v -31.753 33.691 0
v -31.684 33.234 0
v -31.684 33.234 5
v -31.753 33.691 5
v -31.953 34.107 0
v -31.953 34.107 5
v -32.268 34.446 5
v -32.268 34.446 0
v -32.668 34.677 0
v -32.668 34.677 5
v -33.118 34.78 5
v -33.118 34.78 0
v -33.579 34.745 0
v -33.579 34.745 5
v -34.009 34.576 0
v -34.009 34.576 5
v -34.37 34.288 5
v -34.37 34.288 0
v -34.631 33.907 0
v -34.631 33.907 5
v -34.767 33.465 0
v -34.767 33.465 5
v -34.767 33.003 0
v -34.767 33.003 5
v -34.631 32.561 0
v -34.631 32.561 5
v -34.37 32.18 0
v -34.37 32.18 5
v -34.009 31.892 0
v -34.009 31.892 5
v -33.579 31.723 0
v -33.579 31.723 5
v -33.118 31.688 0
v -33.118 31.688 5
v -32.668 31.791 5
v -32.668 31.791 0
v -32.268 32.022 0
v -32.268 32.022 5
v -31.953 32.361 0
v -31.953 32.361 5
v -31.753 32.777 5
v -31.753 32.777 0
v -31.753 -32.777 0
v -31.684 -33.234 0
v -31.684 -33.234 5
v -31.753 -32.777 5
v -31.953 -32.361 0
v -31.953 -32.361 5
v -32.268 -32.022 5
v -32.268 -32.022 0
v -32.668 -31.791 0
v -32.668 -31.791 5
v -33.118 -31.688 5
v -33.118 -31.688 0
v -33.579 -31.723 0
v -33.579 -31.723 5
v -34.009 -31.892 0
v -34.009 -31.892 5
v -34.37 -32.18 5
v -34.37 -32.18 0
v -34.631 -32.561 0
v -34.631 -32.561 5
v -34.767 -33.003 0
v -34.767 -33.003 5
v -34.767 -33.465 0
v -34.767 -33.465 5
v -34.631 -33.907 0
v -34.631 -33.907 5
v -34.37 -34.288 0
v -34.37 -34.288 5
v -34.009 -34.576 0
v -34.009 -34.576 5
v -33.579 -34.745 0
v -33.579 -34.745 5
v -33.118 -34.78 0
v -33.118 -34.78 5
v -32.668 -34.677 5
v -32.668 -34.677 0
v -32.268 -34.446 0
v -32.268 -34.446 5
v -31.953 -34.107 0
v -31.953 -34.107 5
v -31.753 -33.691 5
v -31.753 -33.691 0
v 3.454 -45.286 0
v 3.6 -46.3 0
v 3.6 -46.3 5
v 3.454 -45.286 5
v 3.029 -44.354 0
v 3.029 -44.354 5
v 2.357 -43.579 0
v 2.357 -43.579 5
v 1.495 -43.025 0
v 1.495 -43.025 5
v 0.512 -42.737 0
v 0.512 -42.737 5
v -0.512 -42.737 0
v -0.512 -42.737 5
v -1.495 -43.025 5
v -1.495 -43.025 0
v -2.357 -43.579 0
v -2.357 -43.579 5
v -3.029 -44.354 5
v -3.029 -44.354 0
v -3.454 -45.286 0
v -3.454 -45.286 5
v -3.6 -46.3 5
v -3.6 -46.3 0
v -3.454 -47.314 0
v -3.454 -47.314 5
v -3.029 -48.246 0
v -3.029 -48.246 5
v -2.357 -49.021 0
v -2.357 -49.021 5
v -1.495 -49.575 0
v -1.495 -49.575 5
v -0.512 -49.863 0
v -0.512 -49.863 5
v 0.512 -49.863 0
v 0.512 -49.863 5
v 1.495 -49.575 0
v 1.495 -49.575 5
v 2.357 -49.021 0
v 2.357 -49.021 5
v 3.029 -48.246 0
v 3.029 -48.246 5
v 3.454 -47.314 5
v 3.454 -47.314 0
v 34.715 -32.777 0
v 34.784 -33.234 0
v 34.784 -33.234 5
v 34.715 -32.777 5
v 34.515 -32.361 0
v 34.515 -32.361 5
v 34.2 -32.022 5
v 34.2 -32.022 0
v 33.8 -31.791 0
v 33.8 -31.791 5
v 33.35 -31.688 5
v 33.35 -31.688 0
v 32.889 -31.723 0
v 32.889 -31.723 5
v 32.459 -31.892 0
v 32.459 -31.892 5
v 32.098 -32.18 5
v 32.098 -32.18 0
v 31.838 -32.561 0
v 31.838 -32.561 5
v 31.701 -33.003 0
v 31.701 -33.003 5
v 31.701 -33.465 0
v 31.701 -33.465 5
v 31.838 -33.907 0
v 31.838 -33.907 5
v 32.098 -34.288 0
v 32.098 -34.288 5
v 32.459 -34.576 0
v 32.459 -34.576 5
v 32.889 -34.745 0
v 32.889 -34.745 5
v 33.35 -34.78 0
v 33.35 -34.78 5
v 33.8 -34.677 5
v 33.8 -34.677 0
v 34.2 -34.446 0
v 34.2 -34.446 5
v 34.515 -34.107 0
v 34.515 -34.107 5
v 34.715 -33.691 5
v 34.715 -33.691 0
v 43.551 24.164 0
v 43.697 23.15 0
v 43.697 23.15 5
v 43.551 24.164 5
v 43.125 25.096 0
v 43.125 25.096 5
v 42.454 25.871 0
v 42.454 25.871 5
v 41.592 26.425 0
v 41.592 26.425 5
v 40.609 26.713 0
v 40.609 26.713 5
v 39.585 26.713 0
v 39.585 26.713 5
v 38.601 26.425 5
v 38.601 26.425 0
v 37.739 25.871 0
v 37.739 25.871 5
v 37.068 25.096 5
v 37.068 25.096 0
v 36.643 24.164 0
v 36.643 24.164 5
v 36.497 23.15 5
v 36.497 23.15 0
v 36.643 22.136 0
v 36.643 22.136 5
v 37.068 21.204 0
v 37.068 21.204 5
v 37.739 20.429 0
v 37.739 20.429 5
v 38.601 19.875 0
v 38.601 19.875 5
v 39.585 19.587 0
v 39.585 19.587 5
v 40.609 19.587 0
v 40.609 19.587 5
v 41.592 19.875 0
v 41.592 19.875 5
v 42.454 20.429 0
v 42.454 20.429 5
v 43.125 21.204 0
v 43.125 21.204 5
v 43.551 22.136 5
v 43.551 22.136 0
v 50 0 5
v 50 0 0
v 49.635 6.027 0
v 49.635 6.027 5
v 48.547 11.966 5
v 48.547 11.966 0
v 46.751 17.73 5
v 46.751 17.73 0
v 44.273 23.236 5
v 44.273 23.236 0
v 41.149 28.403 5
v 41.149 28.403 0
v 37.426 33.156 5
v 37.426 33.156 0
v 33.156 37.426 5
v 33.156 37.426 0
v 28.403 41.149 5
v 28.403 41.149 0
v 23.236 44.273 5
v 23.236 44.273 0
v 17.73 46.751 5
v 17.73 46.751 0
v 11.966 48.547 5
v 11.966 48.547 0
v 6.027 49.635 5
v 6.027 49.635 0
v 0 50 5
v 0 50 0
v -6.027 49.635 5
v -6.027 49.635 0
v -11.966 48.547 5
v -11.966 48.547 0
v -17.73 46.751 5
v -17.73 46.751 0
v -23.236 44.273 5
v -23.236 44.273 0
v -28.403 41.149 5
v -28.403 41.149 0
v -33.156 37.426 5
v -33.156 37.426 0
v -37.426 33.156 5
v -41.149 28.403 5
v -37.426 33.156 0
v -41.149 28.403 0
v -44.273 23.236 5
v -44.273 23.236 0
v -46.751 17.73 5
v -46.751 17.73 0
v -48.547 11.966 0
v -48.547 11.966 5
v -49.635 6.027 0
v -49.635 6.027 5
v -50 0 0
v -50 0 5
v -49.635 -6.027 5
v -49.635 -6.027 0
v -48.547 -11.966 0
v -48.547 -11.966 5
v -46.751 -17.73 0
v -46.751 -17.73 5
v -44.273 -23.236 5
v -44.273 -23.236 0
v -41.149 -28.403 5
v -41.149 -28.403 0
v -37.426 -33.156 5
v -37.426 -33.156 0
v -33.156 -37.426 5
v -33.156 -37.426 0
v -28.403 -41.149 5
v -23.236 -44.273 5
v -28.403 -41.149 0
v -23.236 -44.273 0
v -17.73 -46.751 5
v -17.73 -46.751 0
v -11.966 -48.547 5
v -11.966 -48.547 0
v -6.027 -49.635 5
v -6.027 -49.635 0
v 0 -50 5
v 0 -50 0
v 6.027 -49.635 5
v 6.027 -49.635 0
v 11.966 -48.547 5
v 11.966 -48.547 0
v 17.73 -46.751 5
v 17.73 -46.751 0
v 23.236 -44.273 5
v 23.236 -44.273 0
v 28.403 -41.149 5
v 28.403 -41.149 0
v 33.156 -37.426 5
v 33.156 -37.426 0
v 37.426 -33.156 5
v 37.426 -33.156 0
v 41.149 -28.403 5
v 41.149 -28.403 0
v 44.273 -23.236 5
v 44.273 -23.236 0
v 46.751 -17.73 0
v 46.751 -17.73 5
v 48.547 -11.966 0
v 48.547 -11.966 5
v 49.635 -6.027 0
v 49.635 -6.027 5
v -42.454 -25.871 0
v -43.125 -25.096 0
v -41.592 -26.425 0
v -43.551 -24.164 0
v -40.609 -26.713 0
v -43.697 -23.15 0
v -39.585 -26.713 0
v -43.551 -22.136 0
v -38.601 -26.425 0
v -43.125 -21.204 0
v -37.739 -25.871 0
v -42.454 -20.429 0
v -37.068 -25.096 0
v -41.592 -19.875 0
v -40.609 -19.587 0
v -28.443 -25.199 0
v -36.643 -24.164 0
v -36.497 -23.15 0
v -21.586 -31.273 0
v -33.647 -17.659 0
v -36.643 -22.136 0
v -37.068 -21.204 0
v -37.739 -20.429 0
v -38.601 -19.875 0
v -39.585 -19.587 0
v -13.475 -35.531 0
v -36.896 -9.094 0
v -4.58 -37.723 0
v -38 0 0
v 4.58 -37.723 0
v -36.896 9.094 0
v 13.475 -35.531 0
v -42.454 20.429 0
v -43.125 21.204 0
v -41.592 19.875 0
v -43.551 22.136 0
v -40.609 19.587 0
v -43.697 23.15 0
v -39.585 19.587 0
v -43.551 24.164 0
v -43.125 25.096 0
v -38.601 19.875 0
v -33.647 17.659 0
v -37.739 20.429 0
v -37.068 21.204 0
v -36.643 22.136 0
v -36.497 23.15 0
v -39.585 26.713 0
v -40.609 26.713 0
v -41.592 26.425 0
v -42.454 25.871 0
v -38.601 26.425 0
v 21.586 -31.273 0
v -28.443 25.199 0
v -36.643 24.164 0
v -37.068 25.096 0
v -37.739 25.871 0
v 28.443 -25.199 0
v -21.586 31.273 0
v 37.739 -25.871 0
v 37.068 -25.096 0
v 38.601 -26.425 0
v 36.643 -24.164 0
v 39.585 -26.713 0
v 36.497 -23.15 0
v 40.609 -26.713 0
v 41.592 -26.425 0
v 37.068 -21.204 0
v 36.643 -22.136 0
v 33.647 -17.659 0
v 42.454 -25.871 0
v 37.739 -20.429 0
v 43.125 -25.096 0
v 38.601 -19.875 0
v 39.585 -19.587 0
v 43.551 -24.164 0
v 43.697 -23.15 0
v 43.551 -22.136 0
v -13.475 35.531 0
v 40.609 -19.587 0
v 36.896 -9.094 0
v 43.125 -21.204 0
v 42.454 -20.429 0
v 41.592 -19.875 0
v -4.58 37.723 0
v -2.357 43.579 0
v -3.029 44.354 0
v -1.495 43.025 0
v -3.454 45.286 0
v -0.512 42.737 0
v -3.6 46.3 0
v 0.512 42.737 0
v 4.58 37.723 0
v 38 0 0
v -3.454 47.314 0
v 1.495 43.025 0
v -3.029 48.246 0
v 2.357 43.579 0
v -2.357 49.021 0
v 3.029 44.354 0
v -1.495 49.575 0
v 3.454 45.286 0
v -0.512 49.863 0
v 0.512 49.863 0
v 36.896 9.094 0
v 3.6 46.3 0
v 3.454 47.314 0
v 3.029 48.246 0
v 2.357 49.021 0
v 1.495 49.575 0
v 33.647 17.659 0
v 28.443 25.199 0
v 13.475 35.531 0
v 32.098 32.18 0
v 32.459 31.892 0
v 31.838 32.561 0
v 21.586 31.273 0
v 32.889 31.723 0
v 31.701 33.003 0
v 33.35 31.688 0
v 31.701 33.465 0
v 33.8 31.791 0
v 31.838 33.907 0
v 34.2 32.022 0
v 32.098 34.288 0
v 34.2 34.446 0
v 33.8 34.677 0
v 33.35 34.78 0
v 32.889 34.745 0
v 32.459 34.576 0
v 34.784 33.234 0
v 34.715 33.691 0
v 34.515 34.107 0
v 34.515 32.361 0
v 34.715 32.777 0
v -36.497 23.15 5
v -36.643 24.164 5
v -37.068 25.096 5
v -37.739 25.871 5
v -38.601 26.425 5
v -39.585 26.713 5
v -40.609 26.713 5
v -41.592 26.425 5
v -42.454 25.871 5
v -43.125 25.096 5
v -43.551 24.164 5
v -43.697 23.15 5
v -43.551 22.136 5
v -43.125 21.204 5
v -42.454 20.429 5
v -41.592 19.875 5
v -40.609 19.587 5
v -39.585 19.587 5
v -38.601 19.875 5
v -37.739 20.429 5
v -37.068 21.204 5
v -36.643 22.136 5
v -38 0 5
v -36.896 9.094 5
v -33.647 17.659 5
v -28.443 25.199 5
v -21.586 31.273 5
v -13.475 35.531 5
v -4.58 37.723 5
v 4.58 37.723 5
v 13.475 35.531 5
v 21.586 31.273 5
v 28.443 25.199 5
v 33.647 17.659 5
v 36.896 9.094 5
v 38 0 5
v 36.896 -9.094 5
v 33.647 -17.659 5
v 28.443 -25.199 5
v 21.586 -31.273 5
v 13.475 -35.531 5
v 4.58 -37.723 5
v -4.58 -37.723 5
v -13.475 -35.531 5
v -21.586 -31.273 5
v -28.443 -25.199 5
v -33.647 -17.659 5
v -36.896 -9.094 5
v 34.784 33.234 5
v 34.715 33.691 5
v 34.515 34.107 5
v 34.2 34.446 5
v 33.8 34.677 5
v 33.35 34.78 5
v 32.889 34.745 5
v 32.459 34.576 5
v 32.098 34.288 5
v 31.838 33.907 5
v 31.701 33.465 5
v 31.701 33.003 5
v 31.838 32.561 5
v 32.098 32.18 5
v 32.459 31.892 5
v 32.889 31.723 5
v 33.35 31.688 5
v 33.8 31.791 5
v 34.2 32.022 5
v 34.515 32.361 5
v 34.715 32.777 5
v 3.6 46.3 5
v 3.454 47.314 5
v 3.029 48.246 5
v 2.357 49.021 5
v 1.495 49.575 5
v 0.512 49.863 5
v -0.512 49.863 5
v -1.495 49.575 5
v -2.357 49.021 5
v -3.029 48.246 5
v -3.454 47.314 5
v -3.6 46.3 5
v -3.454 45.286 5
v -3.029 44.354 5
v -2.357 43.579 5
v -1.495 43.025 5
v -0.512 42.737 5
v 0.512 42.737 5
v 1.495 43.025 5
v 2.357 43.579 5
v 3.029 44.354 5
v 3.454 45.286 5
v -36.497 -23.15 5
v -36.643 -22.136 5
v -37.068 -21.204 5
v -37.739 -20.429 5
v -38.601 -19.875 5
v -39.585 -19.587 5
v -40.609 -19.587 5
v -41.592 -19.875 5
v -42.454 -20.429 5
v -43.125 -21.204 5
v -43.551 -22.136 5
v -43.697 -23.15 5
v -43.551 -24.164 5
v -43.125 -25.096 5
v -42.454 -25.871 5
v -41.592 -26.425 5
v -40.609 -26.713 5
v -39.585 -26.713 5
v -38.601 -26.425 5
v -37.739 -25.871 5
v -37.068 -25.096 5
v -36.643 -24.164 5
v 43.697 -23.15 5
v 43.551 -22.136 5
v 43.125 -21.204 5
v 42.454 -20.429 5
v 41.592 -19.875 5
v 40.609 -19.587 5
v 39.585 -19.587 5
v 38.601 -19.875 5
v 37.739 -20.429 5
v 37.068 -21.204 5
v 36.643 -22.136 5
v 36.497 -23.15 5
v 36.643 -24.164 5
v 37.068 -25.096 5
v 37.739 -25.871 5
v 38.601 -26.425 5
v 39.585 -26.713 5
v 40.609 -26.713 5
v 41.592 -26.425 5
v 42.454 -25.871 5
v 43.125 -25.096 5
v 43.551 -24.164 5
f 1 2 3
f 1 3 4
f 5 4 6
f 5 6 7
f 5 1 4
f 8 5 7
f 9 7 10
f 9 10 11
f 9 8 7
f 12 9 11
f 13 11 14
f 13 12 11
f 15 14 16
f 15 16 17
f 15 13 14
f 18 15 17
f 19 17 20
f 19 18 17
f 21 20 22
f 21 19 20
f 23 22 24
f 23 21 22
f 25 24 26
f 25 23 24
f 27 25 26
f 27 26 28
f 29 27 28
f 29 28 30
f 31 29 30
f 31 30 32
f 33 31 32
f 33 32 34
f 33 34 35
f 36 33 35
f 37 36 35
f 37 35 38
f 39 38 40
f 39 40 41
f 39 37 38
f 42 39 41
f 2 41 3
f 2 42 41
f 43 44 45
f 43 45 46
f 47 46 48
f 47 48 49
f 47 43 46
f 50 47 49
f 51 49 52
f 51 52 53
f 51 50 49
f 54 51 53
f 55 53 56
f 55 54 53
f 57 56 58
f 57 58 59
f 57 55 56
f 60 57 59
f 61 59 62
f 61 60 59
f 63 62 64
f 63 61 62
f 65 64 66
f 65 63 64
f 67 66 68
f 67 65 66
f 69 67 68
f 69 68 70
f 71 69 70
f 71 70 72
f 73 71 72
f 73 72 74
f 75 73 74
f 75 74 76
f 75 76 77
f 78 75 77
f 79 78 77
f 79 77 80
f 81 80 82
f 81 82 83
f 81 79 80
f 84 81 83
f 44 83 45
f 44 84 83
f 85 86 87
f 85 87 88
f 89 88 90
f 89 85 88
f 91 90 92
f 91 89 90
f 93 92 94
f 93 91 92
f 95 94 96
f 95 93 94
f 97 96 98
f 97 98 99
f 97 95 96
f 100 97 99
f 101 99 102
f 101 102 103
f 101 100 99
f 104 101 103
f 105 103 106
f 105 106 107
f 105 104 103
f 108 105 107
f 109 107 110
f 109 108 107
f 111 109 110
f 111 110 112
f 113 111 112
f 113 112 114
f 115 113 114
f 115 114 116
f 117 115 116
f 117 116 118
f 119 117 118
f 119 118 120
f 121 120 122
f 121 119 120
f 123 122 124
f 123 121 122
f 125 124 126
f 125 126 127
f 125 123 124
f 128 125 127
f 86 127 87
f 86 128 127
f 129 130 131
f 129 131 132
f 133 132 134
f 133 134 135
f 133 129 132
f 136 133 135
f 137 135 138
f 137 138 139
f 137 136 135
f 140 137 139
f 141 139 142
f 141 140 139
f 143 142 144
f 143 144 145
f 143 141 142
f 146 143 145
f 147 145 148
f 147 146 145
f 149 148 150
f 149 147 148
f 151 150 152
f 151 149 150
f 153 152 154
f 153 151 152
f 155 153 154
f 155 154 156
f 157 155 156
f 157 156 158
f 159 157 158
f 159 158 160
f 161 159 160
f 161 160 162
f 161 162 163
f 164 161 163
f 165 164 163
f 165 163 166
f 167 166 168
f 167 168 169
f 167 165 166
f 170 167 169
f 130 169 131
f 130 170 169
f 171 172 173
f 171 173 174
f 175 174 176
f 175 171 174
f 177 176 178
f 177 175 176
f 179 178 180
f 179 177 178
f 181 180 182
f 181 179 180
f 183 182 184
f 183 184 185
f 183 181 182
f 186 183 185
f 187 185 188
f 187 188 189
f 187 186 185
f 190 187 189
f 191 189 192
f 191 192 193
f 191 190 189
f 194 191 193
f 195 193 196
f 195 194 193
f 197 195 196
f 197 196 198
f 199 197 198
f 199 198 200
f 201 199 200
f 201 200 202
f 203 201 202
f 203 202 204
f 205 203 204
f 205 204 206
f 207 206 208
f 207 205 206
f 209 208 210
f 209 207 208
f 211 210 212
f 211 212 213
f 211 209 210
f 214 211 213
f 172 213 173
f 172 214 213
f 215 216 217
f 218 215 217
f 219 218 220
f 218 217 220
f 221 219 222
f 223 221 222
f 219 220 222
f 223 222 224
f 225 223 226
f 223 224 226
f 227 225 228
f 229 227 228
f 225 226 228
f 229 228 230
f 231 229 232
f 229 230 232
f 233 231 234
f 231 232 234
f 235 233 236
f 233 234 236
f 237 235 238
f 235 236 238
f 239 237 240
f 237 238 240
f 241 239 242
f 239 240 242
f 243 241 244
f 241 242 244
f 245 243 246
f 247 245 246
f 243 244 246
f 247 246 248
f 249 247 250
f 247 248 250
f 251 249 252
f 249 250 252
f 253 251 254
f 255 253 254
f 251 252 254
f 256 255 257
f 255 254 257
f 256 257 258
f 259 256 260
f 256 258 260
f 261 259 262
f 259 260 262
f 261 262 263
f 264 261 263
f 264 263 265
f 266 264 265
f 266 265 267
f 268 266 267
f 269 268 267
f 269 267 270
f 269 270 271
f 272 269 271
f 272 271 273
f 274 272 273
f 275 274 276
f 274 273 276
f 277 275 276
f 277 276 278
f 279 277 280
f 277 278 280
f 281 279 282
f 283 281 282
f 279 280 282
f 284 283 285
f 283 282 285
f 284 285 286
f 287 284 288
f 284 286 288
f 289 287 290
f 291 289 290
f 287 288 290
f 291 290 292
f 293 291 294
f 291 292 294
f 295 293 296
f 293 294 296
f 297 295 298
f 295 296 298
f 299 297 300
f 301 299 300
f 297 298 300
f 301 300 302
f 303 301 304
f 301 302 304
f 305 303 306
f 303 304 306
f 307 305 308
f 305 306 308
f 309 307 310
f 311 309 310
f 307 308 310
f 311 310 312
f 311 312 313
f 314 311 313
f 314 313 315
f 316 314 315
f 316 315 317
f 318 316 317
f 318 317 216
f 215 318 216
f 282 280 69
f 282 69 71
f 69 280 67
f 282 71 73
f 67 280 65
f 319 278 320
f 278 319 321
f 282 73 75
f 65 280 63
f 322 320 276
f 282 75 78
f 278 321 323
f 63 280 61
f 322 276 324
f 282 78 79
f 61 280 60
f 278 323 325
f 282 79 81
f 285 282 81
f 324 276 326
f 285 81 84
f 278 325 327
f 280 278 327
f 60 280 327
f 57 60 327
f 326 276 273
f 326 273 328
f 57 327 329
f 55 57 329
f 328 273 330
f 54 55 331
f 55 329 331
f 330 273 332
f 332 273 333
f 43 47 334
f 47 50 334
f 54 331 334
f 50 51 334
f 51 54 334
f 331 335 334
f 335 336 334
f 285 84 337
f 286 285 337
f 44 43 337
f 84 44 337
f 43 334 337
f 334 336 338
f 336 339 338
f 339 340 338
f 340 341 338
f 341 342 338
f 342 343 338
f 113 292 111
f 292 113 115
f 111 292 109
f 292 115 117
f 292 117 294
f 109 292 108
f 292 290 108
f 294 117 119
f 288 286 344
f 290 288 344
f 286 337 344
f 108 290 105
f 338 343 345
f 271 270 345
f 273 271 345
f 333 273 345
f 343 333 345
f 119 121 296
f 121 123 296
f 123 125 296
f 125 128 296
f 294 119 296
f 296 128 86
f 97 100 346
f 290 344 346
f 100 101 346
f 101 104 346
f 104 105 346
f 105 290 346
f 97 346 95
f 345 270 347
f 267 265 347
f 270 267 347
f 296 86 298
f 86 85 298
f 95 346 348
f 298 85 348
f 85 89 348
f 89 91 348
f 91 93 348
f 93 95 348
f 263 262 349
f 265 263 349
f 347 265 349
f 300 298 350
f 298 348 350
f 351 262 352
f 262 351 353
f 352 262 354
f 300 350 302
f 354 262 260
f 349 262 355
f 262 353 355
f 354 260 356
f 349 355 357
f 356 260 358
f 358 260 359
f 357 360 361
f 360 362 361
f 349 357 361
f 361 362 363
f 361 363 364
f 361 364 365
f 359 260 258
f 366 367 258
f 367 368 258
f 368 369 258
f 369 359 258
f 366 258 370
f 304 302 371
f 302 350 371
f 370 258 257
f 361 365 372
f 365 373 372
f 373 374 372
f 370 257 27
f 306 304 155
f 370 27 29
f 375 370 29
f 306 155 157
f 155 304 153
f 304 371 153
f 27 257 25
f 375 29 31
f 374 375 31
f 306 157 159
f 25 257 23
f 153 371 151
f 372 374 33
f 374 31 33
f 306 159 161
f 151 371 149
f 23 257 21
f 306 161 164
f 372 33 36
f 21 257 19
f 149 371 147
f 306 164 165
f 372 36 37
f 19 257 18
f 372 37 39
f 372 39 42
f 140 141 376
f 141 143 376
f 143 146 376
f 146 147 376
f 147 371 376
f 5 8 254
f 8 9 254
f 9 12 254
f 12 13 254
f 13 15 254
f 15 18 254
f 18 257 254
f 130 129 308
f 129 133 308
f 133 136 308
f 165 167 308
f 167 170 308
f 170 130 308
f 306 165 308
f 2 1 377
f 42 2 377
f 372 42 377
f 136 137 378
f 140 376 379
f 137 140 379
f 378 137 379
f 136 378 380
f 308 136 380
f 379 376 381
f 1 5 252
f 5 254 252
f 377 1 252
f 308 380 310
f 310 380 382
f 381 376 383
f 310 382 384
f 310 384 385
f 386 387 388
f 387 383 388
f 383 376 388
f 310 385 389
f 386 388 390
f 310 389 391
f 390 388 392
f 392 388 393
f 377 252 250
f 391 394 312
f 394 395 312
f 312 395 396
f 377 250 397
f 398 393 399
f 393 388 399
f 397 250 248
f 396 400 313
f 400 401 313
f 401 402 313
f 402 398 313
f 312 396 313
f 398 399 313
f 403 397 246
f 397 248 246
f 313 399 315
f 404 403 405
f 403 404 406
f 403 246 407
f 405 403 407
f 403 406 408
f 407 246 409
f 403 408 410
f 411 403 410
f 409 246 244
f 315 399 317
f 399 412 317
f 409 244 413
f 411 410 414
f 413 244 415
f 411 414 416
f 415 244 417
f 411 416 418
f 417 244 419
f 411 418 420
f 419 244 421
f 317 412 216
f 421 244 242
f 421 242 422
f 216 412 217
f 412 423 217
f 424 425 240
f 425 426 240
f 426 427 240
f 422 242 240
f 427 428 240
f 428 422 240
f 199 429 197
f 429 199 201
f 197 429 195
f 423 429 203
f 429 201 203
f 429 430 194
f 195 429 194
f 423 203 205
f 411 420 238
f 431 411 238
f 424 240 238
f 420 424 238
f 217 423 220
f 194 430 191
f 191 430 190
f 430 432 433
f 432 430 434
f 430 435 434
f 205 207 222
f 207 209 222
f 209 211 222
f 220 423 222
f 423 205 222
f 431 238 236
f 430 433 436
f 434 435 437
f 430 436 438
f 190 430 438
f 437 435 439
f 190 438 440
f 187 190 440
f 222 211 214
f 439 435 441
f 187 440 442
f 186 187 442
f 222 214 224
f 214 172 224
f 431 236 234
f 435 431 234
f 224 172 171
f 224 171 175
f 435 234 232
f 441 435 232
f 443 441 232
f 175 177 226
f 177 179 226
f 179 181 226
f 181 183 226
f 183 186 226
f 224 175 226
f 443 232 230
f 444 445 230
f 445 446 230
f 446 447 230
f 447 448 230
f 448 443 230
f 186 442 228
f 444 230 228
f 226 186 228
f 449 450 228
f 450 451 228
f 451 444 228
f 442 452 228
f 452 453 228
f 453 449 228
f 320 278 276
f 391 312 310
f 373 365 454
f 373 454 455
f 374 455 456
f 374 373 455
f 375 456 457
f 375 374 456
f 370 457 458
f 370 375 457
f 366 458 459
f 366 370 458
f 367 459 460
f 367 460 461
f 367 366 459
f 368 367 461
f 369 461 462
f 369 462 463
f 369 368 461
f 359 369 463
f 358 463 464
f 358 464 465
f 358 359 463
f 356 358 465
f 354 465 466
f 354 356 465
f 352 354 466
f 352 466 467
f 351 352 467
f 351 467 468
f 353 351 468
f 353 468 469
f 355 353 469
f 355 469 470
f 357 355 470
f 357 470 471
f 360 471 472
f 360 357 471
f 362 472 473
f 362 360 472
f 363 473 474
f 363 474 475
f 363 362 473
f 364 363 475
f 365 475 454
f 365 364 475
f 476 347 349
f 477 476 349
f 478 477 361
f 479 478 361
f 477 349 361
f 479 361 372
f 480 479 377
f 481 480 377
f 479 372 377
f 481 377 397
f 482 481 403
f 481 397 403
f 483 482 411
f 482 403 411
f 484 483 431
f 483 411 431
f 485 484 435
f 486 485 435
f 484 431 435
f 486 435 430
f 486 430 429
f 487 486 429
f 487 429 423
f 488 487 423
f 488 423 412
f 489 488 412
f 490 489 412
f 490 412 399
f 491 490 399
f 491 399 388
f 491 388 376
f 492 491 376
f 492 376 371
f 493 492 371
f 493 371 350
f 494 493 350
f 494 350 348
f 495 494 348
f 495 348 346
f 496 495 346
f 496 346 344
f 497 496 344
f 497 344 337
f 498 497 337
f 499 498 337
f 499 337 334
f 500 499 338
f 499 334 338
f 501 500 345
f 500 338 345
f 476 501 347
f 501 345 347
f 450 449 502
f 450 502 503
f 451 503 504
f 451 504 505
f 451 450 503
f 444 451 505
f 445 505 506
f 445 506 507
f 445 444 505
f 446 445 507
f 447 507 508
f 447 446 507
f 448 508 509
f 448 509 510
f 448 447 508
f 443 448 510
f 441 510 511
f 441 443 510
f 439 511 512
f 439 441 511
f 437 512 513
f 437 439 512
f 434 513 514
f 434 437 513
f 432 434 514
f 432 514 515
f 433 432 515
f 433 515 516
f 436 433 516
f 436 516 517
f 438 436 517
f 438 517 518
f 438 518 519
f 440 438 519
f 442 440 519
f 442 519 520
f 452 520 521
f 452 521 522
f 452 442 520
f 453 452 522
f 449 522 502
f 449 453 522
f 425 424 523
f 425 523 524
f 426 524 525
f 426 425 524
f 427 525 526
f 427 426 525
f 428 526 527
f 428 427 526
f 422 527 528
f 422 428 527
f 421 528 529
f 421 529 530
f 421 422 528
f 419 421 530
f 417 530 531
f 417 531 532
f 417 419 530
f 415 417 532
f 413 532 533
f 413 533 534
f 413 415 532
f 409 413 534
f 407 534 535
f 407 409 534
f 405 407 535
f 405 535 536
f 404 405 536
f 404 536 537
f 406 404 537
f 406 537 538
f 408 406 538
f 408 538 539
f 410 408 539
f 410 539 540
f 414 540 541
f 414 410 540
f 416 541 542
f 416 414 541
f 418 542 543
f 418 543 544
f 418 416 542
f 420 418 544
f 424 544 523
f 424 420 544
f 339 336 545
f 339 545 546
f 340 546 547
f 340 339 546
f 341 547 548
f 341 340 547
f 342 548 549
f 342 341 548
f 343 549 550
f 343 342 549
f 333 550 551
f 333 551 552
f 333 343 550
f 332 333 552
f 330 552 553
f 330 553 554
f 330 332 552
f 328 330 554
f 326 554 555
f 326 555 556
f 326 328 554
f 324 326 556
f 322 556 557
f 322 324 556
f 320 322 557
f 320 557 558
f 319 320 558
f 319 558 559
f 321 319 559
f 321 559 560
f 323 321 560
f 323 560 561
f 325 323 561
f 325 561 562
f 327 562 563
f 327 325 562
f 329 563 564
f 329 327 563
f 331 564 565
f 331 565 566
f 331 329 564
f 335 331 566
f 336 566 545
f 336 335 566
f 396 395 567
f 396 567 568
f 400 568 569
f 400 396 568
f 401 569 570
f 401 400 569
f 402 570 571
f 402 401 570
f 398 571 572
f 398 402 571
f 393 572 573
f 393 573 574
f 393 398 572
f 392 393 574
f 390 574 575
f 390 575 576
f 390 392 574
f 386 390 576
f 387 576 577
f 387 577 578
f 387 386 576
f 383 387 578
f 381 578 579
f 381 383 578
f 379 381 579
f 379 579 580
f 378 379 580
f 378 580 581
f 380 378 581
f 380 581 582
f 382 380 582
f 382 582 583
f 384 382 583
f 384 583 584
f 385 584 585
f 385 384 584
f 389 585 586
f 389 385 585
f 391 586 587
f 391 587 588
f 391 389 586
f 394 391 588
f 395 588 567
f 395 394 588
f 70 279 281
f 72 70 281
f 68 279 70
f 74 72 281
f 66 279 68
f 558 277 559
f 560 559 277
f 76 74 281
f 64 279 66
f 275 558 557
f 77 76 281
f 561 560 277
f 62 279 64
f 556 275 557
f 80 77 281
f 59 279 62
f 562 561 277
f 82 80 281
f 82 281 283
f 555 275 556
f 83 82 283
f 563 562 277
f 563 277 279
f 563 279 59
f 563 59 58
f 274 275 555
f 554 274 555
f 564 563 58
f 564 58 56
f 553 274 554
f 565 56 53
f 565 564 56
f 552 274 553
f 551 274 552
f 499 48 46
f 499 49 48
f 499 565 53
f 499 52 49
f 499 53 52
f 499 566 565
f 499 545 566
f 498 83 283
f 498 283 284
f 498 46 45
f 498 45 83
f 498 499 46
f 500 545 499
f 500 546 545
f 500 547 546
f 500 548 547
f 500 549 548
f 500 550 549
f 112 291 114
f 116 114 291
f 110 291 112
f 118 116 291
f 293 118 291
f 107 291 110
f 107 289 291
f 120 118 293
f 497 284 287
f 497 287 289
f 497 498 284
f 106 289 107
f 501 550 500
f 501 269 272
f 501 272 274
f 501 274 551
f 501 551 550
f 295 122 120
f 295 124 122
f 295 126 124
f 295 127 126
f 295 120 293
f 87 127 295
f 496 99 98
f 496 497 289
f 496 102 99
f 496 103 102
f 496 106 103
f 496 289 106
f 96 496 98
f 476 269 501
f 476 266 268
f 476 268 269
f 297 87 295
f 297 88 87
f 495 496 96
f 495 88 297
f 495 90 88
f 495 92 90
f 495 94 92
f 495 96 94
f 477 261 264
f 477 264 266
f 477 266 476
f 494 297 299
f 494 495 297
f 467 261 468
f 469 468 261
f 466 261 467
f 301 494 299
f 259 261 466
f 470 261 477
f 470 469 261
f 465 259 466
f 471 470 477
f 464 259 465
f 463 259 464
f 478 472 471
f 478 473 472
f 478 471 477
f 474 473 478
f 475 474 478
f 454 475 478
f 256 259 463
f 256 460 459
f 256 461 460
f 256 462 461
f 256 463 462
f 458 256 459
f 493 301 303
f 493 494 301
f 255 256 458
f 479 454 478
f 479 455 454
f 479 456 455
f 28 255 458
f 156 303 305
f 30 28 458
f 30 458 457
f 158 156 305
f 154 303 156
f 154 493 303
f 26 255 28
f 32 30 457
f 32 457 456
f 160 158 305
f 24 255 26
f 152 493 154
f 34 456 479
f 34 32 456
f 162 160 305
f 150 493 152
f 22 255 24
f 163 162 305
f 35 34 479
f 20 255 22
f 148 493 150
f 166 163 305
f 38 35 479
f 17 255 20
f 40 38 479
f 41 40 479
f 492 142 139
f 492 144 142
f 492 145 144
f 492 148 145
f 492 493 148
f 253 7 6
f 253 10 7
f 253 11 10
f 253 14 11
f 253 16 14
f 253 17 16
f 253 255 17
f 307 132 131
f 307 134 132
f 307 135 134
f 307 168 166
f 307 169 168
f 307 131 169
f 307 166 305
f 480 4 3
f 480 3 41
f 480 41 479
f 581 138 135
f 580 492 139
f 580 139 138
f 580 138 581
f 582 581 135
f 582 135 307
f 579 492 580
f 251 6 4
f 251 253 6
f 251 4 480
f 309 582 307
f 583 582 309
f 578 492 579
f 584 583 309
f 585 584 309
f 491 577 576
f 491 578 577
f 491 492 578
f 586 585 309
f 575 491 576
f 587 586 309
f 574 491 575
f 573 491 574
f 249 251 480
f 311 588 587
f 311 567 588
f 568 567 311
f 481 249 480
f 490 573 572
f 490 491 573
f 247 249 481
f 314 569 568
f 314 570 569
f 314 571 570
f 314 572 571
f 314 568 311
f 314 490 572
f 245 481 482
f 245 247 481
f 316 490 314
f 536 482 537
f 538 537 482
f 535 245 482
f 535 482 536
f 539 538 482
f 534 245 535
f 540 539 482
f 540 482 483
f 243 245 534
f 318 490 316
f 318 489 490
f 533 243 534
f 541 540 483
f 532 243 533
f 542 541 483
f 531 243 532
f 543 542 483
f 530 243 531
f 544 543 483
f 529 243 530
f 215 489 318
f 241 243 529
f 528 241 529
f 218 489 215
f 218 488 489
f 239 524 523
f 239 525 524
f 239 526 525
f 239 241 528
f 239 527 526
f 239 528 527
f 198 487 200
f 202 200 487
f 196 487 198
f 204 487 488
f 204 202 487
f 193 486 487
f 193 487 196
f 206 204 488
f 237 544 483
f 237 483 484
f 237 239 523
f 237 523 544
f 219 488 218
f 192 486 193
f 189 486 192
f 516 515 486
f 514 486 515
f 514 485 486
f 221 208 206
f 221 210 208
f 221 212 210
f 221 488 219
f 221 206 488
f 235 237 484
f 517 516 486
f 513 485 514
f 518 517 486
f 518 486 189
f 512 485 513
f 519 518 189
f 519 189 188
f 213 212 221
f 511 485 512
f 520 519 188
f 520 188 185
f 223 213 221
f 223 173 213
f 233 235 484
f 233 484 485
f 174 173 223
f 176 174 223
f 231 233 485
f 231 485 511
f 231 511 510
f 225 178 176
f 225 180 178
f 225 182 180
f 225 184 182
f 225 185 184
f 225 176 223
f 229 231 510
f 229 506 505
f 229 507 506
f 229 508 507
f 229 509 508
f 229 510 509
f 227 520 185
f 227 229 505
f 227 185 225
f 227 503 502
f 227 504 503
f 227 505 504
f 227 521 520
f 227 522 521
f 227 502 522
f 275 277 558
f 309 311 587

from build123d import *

# Parameters (mm, degrees)
ESQUISSE1_R        = 50
ESQUISSE1_R_2      = 3.6
ESQUISSE1_R_3      = 2.05
ESQUISSE1_R_4      = 1.55
BOSS_EXTRU_1_DEPTH = 5
SKETCH4_R          = 38
CUT_EXTRUDE3_DEPTH = 10


with BuildPart() as part:
    # Esquisse1 → Boss.-Extru.1 (new body)
    with BuildSketch(Plane.XY):
        Circle(ESQUISSE1_R)
        with Locations((-40.096976195, -23.15)):
            Circle(ESQUISSE1_R_2, mode=Mode.SUBTRACT)
        with Locations((-40.096976195, 23.15)):
            Circle(ESQUISSE1_R_2, mode=Mode.SUBTRACT)
        with Locations((0, 46.3)):
            Circle(ESQUISSE1_R_2, mode=Mode.SUBTRACT)
        with Locations((40.096976195, 23.15)):
            Circle(ESQUISSE1_R_2, mode=Mode.SUBTRACT)
        with Locations((40.096976195, -23.15)):
            Circle(ESQUISSE1_R_2, mode=Mode.SUBTRACT)
        with Locations((0, -46.3)):
            Circle(ESQUISSE1_R_2, mode=Mode.SUBTRACT)
        with Locations((0, 19.165334425)):
            Circle(ESQUISSE1_R_3, mode=Mode.SUBTRACT)
        with Locations((0, -19.232757636)):
            Circle(ESQUISSE1_R_3, mode=Mode.SUBTRACT)
        with Locations((-33.234018716, 33.234018716)):
            Circle(ESQUISSE1_R_4, mode=Mode.SUBTRACT)
        with Locations((33.234018716, 33.234018716)):
            Circle(ESQUISSE1_R_4, mode=Mode.SUBTRACT)
        with Locations((33.234018716, -33.234018716)):
            Circle(ESQUISSE1_R_4, mode=Mode.SUBTRACT)
        with Locations((-33.234018716, -33.234018716)):
            Circle(ESQUISSE1_R_4, mode=Mode.SUBTRACT)
        with Locations((-16.671397033, -9.625235564)):
            Circle(ESQUISSE1_R_3, mode=Mode.SUBTRACT)
        with Locations((16.669571796, 9.624181764)):
            Circle(ESQUISSE1_R_3, mode=Mode.SUBTRACT)
        with Locations((-16.671397032, 9.625235564)):
            Circle(ESQUISSE1_R_3, mode=Mode.SUBTRACT)
        with Locations((16.666666667, -9.622504487)):
            Circle(ESQUISSE1_R_3, mode=Mode.SUBTRACT)
    extrude(amount=BOSS_EXTRU_1_DEPTH)

    # Sketch4 → Cut-Extrude3 (cut)
    with BuildSketch(Plane(origin=(0, 0, 0), x_dir=(-1, 0, 0), z_dir=(0, 0, -1))):
        Circle(SKETCH4_R)
    extrude(amount=-CUT_EXTRUDE3_DEPTH, mode=Mode.SUBTRACT)


solid = part.part
